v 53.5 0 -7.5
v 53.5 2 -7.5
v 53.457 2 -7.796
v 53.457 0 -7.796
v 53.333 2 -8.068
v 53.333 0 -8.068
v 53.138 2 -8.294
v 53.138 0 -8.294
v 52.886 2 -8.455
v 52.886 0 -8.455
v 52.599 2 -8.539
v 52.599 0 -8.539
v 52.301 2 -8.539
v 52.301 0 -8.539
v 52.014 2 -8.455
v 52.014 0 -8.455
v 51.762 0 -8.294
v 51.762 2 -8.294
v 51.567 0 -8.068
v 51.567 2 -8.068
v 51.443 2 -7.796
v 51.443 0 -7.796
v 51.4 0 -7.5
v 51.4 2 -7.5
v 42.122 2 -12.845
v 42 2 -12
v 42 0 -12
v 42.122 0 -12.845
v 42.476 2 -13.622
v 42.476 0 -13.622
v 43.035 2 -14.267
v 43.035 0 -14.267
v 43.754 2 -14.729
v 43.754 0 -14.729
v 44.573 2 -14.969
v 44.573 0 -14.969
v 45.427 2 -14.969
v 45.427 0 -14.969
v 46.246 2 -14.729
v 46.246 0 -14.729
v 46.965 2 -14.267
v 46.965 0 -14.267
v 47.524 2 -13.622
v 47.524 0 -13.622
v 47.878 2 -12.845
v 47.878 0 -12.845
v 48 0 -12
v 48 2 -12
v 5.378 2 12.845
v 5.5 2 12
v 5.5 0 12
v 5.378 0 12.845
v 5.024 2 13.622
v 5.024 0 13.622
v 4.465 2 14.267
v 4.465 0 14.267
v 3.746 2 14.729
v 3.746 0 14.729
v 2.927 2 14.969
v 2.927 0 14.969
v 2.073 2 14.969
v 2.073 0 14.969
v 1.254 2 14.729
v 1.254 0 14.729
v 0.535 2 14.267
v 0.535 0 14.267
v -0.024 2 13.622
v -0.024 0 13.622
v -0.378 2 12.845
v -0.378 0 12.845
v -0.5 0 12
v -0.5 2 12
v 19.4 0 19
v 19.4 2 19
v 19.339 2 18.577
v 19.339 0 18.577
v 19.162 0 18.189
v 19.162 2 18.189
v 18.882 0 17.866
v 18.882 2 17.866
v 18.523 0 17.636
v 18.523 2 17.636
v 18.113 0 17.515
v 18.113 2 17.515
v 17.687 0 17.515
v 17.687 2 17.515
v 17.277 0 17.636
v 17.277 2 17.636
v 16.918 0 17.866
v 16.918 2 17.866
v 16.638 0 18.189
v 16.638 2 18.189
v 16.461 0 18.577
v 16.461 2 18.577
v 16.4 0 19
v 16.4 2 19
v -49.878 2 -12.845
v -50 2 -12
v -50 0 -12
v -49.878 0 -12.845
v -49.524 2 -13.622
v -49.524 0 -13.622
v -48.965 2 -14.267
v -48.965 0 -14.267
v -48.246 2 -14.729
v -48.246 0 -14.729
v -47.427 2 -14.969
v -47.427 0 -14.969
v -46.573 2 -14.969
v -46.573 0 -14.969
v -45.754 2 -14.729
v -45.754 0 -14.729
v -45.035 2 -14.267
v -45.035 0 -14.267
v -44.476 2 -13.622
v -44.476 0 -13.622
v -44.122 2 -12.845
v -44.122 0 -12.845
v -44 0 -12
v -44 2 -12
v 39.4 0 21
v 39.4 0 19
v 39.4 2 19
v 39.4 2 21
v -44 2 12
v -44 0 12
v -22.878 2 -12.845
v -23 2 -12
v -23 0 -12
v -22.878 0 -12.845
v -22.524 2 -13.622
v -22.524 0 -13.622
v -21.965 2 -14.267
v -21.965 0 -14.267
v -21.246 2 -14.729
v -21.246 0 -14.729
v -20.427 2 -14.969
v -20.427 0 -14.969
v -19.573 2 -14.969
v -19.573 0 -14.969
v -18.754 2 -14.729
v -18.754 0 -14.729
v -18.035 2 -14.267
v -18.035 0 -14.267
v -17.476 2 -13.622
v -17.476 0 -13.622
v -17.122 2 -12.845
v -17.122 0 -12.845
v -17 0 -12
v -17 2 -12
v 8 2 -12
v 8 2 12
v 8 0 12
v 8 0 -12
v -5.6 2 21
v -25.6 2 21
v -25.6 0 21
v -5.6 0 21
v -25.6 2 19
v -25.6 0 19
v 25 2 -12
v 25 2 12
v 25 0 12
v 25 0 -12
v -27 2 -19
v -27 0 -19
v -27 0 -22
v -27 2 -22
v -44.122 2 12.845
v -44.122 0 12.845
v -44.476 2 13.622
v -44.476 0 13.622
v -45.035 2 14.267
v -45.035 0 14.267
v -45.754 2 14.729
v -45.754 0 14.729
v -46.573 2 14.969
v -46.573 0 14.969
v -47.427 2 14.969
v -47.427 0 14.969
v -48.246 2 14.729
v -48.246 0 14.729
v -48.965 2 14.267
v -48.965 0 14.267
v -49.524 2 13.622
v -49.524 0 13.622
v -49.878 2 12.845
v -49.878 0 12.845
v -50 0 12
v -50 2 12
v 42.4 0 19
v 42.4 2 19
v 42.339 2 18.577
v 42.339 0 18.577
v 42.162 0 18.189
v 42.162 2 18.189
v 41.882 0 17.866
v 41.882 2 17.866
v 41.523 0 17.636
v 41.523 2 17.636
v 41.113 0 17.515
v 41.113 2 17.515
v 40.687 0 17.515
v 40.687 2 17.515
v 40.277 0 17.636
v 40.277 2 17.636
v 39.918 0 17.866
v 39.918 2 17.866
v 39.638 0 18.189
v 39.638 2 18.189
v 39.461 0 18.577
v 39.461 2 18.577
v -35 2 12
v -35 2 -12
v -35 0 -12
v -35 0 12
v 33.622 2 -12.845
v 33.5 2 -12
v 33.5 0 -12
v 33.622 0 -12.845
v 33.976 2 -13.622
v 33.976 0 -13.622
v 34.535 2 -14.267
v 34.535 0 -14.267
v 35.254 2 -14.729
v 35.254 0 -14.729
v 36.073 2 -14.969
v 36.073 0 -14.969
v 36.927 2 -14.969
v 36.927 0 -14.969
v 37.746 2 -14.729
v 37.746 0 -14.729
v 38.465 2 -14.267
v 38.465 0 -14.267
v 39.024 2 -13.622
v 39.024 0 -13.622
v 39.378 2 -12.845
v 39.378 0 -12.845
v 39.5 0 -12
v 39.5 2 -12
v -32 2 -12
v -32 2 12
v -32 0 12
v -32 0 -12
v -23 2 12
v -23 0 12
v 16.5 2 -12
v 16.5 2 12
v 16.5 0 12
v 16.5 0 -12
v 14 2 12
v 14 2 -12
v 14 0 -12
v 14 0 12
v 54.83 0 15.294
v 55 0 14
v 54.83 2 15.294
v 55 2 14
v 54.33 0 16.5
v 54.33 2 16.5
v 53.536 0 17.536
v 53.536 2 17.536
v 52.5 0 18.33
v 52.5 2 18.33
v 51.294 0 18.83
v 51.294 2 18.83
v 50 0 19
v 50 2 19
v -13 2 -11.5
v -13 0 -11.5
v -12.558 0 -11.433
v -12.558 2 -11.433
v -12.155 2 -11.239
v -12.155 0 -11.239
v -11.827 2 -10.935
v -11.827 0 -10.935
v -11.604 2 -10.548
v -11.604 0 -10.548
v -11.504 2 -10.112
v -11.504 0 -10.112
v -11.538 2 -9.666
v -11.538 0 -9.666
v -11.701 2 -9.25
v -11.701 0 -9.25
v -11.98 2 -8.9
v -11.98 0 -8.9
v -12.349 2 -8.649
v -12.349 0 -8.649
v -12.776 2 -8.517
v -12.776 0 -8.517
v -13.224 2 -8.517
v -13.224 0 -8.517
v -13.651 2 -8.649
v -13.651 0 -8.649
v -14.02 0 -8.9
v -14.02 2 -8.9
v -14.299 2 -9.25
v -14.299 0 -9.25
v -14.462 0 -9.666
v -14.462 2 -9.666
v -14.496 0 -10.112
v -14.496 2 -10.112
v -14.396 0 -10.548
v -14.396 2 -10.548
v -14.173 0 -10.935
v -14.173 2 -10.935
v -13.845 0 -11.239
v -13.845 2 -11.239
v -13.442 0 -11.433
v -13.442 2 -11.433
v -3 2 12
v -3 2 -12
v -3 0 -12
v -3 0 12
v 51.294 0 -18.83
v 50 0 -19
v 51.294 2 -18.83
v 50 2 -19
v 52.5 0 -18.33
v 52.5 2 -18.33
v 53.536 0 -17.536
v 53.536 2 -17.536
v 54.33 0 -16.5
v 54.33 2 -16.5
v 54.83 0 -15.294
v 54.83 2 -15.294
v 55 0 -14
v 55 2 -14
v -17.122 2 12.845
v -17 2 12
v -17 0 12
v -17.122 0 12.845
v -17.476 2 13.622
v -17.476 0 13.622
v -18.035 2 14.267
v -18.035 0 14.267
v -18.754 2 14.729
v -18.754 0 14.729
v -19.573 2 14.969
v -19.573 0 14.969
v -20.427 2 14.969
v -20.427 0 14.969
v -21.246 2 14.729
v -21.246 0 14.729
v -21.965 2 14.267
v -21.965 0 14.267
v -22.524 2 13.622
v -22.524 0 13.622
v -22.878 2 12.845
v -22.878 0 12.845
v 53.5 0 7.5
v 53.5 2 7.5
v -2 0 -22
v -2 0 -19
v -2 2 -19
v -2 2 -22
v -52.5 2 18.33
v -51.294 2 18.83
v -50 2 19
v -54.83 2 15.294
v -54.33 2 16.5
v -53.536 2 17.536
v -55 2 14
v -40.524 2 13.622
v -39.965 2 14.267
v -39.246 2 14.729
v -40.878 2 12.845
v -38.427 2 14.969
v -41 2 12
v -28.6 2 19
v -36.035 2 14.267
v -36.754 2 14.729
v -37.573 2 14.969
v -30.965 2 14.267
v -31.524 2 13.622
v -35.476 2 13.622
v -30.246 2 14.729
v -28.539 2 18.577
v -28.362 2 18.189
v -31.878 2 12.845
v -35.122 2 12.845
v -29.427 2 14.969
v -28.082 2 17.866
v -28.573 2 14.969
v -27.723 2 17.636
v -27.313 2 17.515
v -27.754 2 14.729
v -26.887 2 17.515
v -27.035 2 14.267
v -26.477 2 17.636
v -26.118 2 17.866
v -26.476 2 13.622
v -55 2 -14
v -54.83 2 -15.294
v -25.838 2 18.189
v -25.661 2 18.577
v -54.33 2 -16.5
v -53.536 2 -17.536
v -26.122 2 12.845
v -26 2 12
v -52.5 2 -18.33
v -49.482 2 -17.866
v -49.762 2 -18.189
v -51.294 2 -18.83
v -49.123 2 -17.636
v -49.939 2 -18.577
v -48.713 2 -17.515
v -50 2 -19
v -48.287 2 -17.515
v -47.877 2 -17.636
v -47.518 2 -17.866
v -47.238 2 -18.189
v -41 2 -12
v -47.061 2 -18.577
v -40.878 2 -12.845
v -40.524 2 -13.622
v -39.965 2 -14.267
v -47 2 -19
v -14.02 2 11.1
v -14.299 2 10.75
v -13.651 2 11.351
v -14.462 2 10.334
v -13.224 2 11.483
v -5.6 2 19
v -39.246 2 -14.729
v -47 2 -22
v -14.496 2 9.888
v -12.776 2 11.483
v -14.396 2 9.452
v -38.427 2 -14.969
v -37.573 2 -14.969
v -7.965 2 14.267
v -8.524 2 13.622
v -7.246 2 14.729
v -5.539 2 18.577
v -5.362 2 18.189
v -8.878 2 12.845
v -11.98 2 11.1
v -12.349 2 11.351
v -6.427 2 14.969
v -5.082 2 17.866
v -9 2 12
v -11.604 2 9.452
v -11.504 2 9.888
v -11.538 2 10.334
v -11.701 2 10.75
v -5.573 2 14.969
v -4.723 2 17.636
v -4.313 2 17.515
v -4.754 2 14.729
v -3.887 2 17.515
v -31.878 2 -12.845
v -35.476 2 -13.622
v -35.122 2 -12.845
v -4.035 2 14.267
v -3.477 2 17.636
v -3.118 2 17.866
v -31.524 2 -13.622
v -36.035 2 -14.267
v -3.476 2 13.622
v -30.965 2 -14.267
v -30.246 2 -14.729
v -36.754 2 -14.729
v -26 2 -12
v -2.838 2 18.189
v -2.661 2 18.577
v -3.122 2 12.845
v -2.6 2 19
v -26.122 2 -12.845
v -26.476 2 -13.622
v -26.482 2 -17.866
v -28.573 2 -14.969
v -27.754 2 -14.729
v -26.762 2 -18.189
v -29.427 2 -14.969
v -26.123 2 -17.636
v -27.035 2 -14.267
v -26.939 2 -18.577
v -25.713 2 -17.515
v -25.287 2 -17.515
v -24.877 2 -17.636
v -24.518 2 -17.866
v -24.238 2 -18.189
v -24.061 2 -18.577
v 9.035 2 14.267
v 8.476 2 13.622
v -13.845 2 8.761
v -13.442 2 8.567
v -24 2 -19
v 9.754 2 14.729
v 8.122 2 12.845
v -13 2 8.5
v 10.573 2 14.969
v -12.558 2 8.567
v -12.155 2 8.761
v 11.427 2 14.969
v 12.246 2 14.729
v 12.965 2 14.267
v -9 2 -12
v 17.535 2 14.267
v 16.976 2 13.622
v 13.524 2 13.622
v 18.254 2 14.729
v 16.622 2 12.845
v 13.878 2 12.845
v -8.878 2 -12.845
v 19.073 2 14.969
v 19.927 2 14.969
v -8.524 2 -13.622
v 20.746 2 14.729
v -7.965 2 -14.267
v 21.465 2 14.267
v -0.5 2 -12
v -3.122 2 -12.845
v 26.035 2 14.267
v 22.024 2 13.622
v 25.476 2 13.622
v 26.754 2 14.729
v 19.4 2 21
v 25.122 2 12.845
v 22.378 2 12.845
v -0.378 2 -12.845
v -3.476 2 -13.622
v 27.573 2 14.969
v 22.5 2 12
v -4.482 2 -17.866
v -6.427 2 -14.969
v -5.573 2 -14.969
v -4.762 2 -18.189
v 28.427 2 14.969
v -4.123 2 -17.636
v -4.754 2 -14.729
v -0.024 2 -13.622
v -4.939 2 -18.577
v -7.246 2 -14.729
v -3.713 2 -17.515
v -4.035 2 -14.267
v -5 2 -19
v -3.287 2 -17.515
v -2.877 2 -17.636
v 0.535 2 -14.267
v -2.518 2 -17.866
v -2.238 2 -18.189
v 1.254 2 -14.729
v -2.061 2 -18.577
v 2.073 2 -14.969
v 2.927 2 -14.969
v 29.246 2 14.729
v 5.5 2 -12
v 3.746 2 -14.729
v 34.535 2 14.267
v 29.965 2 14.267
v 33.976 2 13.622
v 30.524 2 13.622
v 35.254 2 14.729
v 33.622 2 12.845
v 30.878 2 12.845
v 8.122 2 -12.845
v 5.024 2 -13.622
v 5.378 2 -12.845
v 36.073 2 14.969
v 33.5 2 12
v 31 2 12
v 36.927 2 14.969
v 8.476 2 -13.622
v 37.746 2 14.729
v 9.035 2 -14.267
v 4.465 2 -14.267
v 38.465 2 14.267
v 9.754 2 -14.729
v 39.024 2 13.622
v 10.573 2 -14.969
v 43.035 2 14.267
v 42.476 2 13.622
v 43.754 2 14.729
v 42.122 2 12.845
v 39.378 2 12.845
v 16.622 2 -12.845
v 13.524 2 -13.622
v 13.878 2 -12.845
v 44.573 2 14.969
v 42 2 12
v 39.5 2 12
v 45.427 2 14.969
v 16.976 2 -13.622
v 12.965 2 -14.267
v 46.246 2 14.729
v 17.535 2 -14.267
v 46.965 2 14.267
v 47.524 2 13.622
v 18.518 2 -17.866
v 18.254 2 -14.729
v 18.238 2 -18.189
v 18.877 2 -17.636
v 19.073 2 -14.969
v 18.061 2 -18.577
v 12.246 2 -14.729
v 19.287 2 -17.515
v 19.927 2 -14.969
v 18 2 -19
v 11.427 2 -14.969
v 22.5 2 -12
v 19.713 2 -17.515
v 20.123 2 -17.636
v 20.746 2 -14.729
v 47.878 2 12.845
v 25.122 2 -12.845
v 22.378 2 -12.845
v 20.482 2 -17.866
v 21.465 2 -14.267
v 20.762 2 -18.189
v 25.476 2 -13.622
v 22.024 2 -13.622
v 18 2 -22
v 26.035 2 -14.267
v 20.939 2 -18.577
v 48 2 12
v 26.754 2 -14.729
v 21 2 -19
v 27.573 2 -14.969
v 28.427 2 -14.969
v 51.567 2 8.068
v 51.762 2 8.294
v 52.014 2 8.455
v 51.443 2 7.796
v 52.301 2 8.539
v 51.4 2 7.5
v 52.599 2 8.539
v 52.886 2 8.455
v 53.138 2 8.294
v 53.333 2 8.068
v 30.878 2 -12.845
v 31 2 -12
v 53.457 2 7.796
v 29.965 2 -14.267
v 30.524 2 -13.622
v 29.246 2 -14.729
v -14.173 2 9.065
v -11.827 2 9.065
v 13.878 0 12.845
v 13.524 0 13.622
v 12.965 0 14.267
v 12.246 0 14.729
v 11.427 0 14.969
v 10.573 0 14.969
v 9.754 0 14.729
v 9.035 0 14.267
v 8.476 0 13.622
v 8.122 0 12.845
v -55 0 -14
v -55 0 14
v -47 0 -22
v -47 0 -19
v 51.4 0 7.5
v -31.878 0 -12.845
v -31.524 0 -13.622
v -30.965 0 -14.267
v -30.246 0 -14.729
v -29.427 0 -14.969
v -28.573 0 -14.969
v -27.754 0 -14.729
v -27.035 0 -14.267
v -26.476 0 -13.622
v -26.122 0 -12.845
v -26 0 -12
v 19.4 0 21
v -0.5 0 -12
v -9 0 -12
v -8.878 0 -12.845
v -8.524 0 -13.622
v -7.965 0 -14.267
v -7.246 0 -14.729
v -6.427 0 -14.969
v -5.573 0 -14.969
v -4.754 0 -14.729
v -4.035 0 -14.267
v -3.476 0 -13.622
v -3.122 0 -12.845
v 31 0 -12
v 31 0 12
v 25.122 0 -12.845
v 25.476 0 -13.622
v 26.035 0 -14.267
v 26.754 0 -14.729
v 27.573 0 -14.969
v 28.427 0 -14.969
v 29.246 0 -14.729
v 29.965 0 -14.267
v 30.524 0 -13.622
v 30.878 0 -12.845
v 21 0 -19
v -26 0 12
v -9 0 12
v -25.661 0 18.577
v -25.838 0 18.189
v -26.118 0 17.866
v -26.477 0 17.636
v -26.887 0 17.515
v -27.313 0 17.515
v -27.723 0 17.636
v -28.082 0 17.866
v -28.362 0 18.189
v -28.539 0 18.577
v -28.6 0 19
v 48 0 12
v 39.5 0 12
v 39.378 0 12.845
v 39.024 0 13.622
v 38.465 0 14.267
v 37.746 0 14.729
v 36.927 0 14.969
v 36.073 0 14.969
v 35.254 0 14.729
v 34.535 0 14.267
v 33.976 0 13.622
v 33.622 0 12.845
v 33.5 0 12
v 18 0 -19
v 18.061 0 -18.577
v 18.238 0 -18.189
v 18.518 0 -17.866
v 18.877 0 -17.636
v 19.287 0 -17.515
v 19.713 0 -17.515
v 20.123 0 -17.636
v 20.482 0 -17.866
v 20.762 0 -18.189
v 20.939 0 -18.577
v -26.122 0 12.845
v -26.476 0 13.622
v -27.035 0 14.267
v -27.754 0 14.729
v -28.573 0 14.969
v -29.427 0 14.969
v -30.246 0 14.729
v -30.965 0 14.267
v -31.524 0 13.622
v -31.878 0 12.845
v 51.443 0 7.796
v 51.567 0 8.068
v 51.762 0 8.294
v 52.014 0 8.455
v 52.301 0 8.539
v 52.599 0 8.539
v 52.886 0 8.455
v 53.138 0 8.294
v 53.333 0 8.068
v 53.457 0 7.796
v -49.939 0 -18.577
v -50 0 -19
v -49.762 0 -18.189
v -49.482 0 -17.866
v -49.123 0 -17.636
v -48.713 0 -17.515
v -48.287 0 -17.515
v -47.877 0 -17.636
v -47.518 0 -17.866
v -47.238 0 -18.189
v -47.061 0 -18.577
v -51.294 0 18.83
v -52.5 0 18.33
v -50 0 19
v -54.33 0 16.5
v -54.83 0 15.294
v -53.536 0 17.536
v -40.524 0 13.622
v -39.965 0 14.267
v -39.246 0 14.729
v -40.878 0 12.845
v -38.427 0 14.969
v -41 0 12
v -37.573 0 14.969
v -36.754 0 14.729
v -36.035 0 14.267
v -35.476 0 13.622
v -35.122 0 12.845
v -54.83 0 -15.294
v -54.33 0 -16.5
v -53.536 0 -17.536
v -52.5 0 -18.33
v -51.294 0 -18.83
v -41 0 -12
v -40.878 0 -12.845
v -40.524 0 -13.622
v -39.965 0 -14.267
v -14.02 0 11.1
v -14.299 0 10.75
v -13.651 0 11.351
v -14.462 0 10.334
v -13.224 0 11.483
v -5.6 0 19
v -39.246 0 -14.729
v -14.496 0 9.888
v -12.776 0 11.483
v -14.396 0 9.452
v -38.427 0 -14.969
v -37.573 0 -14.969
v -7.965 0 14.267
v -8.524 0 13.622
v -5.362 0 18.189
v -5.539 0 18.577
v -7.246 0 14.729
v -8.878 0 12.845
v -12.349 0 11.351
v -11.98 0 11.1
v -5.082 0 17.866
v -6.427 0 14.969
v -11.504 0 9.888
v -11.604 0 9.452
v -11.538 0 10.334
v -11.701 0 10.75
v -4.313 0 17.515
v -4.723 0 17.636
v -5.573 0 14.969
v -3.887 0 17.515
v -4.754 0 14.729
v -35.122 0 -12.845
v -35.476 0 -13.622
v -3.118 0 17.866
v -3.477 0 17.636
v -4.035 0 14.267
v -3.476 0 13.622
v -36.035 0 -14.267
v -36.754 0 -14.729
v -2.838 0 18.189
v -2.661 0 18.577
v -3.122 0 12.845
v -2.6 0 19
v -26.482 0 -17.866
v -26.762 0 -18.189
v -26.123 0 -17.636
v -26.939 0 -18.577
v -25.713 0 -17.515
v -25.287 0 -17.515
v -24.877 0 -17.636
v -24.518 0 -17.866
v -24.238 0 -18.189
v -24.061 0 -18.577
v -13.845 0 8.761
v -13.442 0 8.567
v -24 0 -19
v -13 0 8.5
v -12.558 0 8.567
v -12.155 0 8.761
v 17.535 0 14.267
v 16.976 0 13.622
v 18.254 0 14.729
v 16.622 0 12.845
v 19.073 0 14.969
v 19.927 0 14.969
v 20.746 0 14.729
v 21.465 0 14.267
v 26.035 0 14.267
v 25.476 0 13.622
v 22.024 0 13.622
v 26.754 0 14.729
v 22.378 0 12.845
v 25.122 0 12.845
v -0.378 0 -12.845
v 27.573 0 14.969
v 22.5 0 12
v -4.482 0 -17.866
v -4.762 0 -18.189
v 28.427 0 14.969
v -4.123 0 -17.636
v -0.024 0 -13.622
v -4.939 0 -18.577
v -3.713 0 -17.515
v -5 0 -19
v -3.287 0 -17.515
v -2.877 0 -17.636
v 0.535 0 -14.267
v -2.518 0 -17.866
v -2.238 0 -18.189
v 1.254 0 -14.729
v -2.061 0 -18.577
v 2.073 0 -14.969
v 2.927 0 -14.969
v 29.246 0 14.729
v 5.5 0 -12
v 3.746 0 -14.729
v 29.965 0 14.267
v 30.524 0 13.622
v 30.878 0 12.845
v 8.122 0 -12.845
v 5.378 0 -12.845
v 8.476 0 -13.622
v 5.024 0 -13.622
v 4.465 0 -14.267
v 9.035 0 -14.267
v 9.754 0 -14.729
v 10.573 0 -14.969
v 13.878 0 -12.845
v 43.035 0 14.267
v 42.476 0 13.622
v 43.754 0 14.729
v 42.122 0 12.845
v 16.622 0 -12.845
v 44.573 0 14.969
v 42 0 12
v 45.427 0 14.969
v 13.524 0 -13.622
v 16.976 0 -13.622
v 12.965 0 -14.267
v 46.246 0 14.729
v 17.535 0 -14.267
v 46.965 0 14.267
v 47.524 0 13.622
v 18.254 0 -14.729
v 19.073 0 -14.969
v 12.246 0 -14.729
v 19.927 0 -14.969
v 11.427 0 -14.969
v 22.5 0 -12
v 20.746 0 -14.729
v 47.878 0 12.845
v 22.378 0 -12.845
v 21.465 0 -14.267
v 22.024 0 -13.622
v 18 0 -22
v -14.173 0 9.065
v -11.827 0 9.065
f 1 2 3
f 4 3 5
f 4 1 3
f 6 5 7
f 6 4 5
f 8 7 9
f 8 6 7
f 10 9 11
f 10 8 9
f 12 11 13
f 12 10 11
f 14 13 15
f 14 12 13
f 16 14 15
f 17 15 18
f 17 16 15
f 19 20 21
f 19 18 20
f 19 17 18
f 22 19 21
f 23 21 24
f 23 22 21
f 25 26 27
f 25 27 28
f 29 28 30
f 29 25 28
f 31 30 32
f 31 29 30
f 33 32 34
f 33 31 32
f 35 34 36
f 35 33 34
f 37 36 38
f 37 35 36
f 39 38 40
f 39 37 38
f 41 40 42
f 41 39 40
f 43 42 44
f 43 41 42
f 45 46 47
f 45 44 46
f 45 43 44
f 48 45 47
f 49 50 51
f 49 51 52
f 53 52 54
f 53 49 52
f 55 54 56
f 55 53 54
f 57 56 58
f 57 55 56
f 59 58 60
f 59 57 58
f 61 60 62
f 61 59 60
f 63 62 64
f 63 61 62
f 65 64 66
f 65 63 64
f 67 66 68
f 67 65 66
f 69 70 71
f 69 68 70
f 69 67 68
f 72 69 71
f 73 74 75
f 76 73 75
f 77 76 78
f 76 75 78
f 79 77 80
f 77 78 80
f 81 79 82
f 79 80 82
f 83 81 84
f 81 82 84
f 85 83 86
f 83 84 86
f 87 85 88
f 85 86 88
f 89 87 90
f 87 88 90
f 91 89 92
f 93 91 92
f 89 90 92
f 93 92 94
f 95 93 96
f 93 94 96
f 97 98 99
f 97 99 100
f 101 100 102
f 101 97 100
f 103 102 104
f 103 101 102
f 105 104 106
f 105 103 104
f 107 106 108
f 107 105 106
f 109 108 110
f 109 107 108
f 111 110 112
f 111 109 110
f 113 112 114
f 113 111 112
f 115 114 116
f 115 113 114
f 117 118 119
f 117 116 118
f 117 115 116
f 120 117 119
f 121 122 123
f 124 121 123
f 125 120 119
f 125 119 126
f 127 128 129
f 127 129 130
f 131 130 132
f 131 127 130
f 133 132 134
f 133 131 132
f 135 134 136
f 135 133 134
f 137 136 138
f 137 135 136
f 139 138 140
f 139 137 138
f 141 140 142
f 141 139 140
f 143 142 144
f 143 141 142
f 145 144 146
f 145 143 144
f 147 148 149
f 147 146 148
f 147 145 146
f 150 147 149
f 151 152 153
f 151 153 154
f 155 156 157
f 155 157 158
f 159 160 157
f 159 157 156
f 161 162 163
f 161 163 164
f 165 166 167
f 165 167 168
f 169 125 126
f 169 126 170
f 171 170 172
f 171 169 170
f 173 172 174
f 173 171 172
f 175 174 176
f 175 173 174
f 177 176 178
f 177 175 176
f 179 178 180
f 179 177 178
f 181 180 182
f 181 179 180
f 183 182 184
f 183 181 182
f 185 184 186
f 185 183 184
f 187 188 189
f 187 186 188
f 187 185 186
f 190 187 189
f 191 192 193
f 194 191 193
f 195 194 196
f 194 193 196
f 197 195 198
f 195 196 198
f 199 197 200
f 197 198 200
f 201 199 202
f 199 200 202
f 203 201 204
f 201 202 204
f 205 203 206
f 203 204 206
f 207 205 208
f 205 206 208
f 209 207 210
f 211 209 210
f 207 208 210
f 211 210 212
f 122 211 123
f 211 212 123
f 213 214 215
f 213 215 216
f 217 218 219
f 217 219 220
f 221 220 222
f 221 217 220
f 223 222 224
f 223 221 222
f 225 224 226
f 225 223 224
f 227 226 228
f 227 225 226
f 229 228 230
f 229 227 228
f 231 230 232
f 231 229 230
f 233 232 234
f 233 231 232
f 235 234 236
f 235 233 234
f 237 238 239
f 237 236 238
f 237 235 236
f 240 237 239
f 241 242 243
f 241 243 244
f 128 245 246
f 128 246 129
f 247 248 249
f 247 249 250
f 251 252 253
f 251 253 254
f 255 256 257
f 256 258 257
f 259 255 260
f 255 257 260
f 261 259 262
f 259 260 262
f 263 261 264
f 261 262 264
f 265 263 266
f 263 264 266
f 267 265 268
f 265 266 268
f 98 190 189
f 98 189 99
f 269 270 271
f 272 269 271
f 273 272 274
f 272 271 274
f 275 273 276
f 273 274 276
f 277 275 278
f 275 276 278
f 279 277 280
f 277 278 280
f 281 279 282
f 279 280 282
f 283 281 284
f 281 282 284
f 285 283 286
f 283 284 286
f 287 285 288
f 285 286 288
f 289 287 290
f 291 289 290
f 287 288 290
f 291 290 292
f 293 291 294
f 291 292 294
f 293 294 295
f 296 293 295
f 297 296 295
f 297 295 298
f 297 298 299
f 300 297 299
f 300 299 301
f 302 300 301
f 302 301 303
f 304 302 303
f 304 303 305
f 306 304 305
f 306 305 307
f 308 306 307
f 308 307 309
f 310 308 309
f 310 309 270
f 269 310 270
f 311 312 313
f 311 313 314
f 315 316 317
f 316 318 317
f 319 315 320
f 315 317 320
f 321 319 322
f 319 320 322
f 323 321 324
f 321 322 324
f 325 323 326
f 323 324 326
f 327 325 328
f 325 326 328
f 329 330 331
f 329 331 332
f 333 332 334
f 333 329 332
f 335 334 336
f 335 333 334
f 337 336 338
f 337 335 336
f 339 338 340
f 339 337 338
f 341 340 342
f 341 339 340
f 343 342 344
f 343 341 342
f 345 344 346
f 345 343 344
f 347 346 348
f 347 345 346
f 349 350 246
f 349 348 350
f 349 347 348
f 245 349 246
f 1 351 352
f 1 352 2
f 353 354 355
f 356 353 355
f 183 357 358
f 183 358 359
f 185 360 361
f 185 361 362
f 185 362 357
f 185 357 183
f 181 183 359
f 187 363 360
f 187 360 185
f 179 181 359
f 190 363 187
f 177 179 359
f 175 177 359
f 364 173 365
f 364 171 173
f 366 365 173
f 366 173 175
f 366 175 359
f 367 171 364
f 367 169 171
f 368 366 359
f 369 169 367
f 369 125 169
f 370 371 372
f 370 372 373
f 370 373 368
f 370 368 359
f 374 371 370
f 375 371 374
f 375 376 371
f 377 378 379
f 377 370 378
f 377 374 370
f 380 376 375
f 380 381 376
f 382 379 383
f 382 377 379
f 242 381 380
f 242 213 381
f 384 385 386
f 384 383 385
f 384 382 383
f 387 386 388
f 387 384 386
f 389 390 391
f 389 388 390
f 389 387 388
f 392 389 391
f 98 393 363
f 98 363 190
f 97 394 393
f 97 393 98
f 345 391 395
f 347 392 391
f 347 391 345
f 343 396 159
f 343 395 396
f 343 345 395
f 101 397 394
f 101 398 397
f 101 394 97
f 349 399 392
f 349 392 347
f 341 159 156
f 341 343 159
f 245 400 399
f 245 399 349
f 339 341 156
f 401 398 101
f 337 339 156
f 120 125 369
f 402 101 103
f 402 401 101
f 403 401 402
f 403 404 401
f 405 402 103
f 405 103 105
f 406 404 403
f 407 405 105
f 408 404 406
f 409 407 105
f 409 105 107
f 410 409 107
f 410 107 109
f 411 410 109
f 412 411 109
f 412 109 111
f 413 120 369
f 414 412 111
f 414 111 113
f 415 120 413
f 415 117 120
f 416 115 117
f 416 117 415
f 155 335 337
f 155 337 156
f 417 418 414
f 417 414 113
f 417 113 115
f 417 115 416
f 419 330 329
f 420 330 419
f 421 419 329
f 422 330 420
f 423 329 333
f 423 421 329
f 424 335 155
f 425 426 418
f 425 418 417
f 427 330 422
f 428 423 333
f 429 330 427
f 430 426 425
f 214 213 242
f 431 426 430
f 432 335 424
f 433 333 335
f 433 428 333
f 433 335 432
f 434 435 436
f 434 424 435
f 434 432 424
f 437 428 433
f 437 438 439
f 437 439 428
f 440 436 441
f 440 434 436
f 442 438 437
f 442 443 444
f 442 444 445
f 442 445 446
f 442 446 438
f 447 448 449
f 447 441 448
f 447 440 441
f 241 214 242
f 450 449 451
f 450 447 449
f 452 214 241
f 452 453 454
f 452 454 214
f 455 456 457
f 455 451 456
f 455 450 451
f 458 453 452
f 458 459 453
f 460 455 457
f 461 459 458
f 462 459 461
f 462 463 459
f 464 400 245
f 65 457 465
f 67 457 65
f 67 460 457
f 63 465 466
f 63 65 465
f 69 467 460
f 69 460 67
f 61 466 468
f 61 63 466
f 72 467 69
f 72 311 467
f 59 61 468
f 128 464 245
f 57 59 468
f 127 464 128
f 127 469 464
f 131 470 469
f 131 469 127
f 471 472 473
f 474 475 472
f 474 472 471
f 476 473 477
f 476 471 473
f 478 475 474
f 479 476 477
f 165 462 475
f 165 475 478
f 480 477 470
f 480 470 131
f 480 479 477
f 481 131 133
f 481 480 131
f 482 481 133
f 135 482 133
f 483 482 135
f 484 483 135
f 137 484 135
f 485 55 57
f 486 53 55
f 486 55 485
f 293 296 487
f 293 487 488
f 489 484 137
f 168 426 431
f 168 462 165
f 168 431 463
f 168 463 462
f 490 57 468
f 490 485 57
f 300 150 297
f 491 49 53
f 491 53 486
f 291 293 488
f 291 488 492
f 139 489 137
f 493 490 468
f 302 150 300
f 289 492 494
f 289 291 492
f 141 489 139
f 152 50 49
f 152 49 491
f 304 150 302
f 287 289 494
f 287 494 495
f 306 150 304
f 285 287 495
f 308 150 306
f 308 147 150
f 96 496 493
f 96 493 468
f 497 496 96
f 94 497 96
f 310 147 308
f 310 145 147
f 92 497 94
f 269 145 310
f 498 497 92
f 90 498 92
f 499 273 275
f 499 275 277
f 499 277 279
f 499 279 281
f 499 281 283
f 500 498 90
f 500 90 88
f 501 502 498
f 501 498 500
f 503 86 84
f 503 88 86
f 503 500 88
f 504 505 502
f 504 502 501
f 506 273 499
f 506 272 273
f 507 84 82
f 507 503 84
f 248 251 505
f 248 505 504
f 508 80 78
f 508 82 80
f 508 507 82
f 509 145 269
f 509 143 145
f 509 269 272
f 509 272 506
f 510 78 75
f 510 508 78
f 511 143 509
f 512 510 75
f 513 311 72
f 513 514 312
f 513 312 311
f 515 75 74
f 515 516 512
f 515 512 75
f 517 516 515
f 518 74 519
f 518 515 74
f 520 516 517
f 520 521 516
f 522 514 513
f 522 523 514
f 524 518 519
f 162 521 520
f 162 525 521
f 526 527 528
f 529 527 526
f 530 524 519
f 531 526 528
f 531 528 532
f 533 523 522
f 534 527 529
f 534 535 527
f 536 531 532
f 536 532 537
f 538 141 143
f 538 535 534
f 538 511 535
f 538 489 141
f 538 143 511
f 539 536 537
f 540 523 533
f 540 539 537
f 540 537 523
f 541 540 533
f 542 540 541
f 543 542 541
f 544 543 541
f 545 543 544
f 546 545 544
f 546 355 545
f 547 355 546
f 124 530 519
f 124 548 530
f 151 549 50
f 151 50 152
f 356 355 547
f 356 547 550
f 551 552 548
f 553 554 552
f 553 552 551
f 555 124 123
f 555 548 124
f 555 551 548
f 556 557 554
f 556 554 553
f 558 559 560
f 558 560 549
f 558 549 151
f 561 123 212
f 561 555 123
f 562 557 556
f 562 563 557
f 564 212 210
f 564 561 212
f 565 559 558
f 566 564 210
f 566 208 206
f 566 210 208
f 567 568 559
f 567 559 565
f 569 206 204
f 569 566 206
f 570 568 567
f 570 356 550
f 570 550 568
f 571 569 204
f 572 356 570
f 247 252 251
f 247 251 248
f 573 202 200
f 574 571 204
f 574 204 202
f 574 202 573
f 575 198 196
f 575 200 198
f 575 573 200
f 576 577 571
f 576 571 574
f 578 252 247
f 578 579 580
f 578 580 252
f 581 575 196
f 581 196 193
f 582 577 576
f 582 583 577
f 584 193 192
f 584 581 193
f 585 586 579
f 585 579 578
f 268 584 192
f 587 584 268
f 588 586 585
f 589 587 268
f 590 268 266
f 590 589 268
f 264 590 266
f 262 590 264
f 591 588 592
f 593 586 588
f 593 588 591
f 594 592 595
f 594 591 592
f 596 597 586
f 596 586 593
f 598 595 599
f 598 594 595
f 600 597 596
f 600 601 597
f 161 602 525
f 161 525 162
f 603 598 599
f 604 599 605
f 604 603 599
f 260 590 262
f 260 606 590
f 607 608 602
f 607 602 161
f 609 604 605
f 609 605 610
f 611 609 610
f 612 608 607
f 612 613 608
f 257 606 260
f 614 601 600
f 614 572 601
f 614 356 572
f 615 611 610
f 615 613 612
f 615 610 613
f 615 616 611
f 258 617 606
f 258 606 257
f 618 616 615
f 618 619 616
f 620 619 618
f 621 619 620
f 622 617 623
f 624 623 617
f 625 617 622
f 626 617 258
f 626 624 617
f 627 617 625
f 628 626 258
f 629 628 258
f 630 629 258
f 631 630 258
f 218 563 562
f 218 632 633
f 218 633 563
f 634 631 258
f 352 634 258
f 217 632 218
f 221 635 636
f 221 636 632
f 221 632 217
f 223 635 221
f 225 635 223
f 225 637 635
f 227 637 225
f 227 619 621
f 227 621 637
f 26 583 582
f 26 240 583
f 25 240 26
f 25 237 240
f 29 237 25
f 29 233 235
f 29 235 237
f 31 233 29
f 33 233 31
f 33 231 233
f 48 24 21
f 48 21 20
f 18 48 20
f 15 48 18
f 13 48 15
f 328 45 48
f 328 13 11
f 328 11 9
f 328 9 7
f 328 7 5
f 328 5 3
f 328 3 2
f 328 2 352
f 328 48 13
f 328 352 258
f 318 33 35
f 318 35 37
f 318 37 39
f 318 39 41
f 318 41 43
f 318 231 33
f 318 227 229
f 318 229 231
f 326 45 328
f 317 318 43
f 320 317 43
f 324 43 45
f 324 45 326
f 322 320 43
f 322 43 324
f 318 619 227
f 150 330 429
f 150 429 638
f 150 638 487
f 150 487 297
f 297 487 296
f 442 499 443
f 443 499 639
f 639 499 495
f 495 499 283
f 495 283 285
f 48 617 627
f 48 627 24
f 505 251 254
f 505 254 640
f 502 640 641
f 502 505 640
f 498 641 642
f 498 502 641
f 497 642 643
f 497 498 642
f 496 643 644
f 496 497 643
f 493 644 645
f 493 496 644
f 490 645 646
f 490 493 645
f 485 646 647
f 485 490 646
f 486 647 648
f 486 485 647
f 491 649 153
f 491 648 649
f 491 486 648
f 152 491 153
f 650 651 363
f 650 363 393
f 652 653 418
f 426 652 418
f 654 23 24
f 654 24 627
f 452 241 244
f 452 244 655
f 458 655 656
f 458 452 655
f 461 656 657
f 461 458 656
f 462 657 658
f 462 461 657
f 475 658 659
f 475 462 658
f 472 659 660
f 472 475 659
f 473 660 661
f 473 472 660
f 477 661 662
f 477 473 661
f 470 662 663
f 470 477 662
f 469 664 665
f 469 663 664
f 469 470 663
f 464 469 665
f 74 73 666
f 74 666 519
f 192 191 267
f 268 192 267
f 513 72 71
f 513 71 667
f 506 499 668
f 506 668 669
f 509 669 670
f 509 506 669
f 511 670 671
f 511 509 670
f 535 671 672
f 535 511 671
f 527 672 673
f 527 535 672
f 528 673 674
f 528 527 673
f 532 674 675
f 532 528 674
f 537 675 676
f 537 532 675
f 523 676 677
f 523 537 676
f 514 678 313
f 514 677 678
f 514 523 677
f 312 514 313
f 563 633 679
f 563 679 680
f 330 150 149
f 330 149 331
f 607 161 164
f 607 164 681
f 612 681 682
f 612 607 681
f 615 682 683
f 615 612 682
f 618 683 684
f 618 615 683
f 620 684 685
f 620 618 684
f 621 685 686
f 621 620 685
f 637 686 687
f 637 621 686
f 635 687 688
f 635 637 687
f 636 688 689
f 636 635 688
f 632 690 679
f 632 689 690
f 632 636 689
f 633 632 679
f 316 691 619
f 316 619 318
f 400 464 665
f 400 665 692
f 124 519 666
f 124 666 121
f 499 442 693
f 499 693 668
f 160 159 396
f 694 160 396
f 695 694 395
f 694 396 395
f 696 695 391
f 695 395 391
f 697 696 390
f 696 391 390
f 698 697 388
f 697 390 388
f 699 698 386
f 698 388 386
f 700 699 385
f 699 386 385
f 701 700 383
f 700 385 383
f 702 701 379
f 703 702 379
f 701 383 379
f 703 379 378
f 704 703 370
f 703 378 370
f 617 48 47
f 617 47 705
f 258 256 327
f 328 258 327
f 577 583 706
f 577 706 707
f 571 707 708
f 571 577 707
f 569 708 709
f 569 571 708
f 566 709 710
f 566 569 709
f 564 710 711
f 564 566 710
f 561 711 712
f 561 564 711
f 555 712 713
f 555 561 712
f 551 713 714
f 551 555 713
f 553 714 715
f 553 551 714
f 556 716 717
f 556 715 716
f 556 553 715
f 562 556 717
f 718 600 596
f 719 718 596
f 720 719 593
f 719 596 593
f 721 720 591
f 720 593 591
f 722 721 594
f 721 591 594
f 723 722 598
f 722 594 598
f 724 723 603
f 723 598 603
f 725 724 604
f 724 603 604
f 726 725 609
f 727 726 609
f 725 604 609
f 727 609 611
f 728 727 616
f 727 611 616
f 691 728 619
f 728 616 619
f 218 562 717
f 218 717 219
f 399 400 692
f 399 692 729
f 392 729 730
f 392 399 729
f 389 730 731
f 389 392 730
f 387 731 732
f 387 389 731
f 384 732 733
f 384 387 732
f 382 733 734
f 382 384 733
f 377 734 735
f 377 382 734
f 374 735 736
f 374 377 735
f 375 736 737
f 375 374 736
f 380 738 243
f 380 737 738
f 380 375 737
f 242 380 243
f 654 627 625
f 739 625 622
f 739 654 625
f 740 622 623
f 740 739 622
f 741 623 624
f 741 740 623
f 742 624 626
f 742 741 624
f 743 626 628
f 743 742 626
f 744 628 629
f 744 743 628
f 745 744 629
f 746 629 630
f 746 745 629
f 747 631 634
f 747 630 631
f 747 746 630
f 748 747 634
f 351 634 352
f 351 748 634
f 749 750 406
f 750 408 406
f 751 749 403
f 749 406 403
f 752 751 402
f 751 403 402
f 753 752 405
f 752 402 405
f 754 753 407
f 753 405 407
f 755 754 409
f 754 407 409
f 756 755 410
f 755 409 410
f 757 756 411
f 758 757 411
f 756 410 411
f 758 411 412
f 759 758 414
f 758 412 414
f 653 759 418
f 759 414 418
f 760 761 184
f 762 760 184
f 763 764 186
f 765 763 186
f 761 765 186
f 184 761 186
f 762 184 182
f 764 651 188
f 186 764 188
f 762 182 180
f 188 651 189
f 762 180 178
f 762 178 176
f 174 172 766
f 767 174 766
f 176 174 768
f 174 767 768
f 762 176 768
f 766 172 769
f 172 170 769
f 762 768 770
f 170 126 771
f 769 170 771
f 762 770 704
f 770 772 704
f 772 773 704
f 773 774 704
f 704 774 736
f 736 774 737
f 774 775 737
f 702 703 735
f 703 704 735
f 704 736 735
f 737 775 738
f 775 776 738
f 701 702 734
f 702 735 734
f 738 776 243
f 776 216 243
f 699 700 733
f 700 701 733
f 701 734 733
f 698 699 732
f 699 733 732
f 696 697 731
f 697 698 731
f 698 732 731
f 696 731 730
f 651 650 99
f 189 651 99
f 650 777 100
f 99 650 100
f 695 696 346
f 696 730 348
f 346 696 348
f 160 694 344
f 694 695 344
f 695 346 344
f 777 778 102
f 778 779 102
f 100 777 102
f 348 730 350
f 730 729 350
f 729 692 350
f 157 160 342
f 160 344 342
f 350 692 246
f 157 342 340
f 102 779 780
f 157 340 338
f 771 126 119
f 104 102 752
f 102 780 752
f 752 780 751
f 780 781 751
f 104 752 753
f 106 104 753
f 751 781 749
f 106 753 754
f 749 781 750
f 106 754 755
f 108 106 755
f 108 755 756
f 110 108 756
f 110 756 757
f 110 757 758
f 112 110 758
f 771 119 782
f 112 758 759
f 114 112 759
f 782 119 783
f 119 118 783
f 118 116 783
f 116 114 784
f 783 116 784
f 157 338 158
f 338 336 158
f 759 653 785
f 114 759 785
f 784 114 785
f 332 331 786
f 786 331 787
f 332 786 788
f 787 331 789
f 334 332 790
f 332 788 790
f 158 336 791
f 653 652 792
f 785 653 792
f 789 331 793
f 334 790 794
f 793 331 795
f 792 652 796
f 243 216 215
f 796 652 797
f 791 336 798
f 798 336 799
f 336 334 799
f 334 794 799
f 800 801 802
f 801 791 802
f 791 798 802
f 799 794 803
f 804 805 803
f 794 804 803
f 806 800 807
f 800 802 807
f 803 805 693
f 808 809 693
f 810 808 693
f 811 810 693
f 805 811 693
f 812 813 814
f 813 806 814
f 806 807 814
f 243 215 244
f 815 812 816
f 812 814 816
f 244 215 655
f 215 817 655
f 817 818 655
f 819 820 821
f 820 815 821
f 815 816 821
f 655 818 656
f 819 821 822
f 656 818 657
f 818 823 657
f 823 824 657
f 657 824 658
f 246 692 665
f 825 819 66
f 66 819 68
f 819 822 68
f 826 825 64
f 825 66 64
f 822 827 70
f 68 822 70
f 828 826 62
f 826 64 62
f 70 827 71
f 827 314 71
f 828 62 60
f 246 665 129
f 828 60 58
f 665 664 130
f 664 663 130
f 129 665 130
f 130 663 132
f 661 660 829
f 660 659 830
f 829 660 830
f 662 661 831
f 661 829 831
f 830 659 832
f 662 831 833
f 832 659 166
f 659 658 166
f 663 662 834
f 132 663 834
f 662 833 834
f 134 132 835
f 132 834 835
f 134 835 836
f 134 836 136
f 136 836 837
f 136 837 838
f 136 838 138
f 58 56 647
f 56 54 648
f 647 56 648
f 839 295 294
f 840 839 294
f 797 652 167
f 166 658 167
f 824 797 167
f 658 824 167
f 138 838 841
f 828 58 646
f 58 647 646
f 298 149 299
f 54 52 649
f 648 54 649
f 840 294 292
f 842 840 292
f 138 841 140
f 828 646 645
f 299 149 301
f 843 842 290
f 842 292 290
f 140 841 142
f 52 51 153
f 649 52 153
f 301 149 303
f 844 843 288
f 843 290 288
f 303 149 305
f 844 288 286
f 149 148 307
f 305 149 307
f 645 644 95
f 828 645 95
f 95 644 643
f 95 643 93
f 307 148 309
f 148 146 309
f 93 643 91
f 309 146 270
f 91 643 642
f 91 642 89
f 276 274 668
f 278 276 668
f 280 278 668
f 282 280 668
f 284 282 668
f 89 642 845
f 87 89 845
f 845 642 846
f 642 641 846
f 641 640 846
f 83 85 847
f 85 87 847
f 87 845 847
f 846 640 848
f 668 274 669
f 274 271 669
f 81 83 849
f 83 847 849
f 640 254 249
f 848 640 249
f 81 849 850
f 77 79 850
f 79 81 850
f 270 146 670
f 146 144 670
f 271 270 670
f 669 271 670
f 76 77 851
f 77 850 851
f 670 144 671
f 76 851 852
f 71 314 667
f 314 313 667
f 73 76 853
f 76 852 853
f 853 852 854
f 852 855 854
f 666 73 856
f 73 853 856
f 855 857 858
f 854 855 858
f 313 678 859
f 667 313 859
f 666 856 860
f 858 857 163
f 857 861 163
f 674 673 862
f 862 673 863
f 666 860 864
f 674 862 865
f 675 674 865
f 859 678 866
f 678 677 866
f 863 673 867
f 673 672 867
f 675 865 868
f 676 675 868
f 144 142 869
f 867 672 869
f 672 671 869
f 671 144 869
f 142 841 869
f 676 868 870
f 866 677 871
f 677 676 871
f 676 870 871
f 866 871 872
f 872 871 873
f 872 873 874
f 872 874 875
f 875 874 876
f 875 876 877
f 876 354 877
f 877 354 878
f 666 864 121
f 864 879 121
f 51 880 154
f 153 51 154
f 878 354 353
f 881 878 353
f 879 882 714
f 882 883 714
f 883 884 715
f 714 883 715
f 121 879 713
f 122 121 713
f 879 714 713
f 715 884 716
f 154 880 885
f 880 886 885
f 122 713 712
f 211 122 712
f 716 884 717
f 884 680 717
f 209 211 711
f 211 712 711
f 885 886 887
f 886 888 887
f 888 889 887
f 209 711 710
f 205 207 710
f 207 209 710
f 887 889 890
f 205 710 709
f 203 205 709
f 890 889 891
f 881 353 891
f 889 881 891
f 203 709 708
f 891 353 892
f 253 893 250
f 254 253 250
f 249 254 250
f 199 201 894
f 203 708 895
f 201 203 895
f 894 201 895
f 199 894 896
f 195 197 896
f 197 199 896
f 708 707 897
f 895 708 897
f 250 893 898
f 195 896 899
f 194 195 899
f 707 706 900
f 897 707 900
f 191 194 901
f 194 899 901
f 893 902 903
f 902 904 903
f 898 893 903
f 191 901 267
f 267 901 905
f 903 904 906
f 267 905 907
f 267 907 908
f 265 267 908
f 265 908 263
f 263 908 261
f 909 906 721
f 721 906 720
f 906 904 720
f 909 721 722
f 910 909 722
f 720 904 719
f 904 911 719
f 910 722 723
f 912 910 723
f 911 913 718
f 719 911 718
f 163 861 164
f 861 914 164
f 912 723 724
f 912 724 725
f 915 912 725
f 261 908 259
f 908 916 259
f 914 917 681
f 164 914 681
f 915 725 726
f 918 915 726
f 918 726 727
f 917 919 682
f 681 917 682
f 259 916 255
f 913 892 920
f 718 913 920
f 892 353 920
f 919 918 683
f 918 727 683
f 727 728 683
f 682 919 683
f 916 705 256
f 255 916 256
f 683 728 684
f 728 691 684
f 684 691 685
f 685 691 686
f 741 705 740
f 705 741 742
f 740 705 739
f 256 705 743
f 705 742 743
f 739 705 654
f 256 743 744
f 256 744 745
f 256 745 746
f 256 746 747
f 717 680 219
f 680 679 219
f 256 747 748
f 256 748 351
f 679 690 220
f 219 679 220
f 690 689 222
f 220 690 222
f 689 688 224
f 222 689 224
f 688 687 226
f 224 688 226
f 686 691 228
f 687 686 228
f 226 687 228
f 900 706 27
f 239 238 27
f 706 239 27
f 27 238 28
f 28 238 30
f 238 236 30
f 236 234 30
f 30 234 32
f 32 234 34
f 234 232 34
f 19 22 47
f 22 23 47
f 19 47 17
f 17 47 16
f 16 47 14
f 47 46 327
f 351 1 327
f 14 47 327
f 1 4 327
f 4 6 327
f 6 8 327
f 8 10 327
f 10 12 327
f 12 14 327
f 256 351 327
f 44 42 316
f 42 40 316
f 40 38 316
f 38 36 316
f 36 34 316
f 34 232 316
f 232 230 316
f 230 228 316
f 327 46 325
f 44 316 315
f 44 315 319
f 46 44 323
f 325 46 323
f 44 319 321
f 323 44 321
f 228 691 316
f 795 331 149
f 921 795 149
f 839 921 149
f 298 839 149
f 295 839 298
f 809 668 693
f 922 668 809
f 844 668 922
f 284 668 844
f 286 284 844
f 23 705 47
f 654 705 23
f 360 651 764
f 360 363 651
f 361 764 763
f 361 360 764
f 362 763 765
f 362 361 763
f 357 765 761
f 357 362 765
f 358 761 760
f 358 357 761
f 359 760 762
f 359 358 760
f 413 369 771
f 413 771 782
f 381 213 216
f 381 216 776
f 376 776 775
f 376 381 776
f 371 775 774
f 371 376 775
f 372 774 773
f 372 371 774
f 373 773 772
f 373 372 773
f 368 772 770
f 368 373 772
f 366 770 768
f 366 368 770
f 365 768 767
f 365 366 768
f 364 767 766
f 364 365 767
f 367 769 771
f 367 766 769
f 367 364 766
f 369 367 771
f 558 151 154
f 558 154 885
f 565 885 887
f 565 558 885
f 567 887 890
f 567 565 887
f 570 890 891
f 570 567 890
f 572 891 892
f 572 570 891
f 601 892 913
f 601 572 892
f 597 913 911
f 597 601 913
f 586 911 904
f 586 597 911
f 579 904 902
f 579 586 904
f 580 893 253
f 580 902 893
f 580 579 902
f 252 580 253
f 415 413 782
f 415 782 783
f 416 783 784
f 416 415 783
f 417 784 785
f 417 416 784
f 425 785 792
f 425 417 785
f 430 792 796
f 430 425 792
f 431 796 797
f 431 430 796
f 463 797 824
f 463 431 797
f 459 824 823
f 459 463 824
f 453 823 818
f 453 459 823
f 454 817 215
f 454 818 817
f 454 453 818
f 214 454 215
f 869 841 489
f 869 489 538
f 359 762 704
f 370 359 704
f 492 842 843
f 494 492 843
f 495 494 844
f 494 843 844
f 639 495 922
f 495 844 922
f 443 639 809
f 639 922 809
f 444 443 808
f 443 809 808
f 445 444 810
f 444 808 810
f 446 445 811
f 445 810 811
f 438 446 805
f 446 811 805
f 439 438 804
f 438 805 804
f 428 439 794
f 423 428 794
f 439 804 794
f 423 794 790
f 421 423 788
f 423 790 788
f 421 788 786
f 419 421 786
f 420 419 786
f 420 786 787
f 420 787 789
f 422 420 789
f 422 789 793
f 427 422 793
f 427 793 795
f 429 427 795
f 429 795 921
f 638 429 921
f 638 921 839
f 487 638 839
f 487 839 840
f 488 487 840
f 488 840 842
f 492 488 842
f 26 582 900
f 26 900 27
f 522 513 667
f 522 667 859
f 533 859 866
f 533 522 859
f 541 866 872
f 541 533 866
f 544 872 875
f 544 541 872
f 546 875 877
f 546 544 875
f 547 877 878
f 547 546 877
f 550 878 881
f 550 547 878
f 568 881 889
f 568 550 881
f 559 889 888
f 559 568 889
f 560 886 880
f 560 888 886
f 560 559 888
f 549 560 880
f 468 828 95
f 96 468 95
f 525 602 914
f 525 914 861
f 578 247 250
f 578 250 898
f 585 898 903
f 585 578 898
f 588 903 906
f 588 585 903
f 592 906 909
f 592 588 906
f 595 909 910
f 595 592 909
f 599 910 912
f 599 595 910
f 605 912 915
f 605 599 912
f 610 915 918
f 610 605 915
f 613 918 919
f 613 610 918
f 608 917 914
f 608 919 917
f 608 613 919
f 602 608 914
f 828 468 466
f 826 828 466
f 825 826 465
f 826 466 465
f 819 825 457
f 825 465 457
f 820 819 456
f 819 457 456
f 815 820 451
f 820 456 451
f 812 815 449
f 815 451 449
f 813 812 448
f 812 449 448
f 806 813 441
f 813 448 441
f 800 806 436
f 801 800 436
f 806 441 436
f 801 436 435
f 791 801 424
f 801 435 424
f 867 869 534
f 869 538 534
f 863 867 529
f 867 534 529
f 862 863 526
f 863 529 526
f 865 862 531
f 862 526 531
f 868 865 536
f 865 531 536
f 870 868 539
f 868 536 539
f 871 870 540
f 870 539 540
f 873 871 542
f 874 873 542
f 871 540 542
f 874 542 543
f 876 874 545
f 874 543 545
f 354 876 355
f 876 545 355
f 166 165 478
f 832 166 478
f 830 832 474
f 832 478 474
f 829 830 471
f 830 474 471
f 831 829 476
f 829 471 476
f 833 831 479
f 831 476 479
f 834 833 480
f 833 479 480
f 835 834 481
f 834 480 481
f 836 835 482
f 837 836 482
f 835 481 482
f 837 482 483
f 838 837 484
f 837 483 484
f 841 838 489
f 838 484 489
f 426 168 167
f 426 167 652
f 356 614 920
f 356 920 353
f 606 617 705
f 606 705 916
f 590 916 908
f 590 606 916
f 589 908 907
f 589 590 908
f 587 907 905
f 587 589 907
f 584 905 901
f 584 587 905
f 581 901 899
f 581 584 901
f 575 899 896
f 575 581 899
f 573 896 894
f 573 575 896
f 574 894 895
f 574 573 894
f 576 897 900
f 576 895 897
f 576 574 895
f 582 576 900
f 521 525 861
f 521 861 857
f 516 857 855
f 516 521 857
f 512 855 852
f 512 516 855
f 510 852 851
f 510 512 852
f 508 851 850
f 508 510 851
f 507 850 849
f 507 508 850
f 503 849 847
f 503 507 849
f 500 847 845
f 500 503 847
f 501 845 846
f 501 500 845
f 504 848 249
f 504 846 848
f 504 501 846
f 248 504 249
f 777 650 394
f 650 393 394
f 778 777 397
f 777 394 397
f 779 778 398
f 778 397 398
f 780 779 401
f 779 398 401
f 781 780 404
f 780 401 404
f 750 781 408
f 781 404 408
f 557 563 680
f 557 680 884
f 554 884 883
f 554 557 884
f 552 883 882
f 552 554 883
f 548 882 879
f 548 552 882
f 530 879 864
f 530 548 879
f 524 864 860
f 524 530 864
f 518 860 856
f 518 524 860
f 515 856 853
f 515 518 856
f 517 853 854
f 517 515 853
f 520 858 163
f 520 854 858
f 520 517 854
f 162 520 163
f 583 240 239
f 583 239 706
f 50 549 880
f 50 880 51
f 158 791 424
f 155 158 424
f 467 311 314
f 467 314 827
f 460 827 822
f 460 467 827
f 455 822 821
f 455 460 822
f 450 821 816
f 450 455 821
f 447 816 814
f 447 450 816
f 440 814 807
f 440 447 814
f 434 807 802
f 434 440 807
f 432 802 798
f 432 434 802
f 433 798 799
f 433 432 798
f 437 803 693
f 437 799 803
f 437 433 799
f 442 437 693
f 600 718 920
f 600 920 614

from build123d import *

# Parameters (mm, degrees)
SKETCH_1_W          = 110
SKETCH_1_H          = 38
EXTRUDE_1_DEPTH     = 2
SKETCH_2_W          = 20
SKETCH_2_H          = 2
EXTRUDE_2_DEPTH     = 3
SKETCH_4_W          = 20
SKETCH_4_H          = 2
EXTRUDE_3_DEPTH     = 2
CUT_EXTRUDE_2_DEPTH = 60.270566051
SKETCH_7_R          = 1.5
CUT_EXTRUDE_4_DEPTH = 60.270566051
SKETCH_13_R         = 1.5
CUT_EXTRUDE_6_DEPTH = 60.270566051
FILLET_1_R          = 5
CUT_EXTRUDE_8_DEPTH = 60.270566051


with BuildPart() as part:
    # 草图1 → 凸台-拉伸1 (new body)
    with BuildSketch(Plane(origin=(0, 0, 0), x_dir=(1, 0, 0), z_dir=(0, 1, 0))):
        Rectangle(SKETCH_1_W, SKETCH_1_H)
    extrude(amount=EXTRUDE_1_DEPTH)

    # 草图2 → 凸台-拉伸2 (add)
    with BuildSketch(Plane(origin=(0, 0, -19), x_dir=(-1, 0, 0), z_dir=(0, 0, -1))):
        with Locations((-8, 1)):
            Rectangle(SKETCH_2_W, SKETCH_2_H)
        with Locations((37, 1)):
            Rectangle(SKETCH_2_W, SKETCH_2_H)
    extrude(amount=EXTRUDE_2_DEPTH)

    # 草图4 → 凸台-拉伸3 (add)
    with BuildSketch(Plane.XY.offset(19)):
        with Locations((-15.6, 1)):
            Rectangle(SKETCH_4_W, SKETCH_4_H)
        with Locations((29.4, 1)):
            Rectangle(SKETCH_4_W, SKETCH_4_H)
    extrude(amount=EXTRUDE_3_DEPTH)

    # 草图6 → 切除-拉伸2 (cut, through all)
    with BuildSketch(Plane.XZ):
        with BuildLine():
            Line((53.5, 7.5), (53.5, -7.5))
            ThreePointArc((53.5, -7.5), (52.45, -8.55), (51.4, -7.5))
            Line((51.4, -7.5), (51.4, 7.5))
            ThreePointArc((51.4, 7.5), (52.45, 8.55), (53.5, 7.5))
        make_face()
    extrude(amount=-CUT_EXTRUDE_2_DEPTH, mode=Mode.SUBTRACT)

    # 草图7 → 切除-拉伸4 (cut, through all)
    with BuildSketch(Plane.XZ):
        with Locations(Location((-13, -10, 0), (0, 0, 270))):
            Circle(SKETCH_7_R)
        with Locations(Location((-13, 10, 0), (0, 0, 270))):
            Circle(SKETCH_7_R)
    extrude(amount=-CUT_EXTRUDE_4_DEPTH, mode=Mode.SUBTRACT)

    # 草图13 → 切除-拉伸6 (cut, through all)
    with BuildSketch(Plane(origin=(0, 2, 0), x_dir=(1, 0, 0), z_dir=(0, 1, 0))):
        with Locations((-48.5, 19)):
            Circle(SKETCH_13_R)
        with Locations((-25.5, 19)):
            Circle(SKETCH_13_R)
        with Locations((-3.5, 19)):
            Circle(SKETCH_13_R)
        with Locations((19.5, 19)):
            Circle(SKETCH_13_R)
        with Locations((-27.1, -19)):
            Circle(SKETCH_13_R)
        with Locations((-4.1, -19)):
            Circle(SKETCH_13_R)
        with Locations((17.9, -19)):
            Circle(SKETCH_13_R)
        with Locations((40.9, -19)):
            Circle(SKETCH_13_R)
    extrude(amount=-CUT_EXTRUDE_6_DEPTH, mode=Mode.SUBTRACT)

    # 圆角1
    fillet_1_edges = [part.edges().sort_by_distance(p)[0] for p in [
        (55, 1, 19),
        (-55, 1, 19),
        (-55, 1, -19),
        (55, 1, -19),
    ]]
    fillet(fillet_1_edges, radius=FILLET_1_R - 0.0001)  # a hair under: the kernel refuses the full size

    # 草图12 → 切除-拉伸8 (cut, through all)
    with BuildSketch(Plane(origin=(0, 2, 0), x_dir=(1, 0, 0), z_dir=(0, 1, 0))):
        with BuildLine():
            Line((48, 12), (48, -12))
            ThreePointArc((48, -12), (45, -15), (42, -12))
            Line((42, -12), (42, 12))
            ThreePointArc((42, 12), (45, 15), (48, 12))
        make_face()
        with BuildLine():
            Line((39.5, 12), (39.5, -12))
            ThreePointArc((39.5, -12), (36.5, -15), (33.5, -12))
            Line((33.5, -12), (33.5, 12))
            ThreePointArc((33.5, 12), (36.5, 15), (39.5, 12))
        make_face()
        with BuildLine():
            Line((31, 12), (31, -12))
            ThreePointArc((31, -12), (28, -15), (25, -12))
            Line((25, -12), (25, 12))
            ThreePointArc((25, 12), (28, 15), (31, 12))
        make_face()
        with BuildLine():
            Line((22.5, 12), (22.5, -12))
            ThreePointArc((22.5, -12), (19.5, -15), (16.5, -12))
            Line((16.5, -12), (16.5, 12))
            ThreePointArc((16.5, 12), (19.5, 15), (22.5, 12))
        make_face()
        with BuildLine():
            Line((14, 12), (14, -12))
            ThreePointArc((14, -12), (11, -15), (8, -12))
            Line((8, -12), (8, 12))
            ThreePointArc((8, 12), (11, 15), (14, 12))
        make_face()
        with BuildLine():
            Line((5.5, 12), (5.5, -12))
            ThreePointArc((5.5, -12), (2.5, -15), (-0.5, -12))
            Line((-0.5, -12), (-0.5, 12))
            ThreePointArc((-0.5, 12), (2.5, 15), (5.5, 12))
        make_face()
        with BuildLine():
            Line((-3, 12), (-3, -12))
            ThreePointArc((-3, -12), (-6, -15), (-9, -12))
            Line((-9, -12), (-9, 12))
            ThreePointArc((-9, 12), (-6, 15), (-3, 12))
        make_face()
        with BuildLine():
            Line((-17, 12), (-17, -12))
            ThreePointArc((-17, -12), (-20, -15), (-23, -12))
            Line((-23, -12), (-23, 12))
            ThreePointArc((-23, 12), (-20, 15), (-17, 12))
        make_face()
        with BuildLine():
            Line((-26, 12), (-26, -12))
            ThreePointArc((-26, -12), (-29, -15), (-32, -12))
            Line((-32, -12), (-32, 12))
            ThreePointArc((-32, 12), (-29, 15), (-26, 12))
        make_face()
        with BuildLine():
            Line((-35, 12), (-35, -12))
            ThreePointArc((-35, -12), (-38, -15), (-41, -12))
            Line((-41, -12), (-41, 12))
            ThreePointArc((-41, 12), (-38, 15), (-35, 12))
        make_face()
        with BuildLine():
            Line((-44, 12), (-44, -12))
            ThreePointArc((-44, -12), (-47, -15), (-50, -12))
            Line((-50, -12), (-50, 12))
            ThreePointArc((-50, 12), (-47, 15), (-44, 12))
        make_face()
    extrude(amount=-CUT_EXTRUDE_8_DEPTH, mode=Mode.SUBTRACT)


solid = part.part
